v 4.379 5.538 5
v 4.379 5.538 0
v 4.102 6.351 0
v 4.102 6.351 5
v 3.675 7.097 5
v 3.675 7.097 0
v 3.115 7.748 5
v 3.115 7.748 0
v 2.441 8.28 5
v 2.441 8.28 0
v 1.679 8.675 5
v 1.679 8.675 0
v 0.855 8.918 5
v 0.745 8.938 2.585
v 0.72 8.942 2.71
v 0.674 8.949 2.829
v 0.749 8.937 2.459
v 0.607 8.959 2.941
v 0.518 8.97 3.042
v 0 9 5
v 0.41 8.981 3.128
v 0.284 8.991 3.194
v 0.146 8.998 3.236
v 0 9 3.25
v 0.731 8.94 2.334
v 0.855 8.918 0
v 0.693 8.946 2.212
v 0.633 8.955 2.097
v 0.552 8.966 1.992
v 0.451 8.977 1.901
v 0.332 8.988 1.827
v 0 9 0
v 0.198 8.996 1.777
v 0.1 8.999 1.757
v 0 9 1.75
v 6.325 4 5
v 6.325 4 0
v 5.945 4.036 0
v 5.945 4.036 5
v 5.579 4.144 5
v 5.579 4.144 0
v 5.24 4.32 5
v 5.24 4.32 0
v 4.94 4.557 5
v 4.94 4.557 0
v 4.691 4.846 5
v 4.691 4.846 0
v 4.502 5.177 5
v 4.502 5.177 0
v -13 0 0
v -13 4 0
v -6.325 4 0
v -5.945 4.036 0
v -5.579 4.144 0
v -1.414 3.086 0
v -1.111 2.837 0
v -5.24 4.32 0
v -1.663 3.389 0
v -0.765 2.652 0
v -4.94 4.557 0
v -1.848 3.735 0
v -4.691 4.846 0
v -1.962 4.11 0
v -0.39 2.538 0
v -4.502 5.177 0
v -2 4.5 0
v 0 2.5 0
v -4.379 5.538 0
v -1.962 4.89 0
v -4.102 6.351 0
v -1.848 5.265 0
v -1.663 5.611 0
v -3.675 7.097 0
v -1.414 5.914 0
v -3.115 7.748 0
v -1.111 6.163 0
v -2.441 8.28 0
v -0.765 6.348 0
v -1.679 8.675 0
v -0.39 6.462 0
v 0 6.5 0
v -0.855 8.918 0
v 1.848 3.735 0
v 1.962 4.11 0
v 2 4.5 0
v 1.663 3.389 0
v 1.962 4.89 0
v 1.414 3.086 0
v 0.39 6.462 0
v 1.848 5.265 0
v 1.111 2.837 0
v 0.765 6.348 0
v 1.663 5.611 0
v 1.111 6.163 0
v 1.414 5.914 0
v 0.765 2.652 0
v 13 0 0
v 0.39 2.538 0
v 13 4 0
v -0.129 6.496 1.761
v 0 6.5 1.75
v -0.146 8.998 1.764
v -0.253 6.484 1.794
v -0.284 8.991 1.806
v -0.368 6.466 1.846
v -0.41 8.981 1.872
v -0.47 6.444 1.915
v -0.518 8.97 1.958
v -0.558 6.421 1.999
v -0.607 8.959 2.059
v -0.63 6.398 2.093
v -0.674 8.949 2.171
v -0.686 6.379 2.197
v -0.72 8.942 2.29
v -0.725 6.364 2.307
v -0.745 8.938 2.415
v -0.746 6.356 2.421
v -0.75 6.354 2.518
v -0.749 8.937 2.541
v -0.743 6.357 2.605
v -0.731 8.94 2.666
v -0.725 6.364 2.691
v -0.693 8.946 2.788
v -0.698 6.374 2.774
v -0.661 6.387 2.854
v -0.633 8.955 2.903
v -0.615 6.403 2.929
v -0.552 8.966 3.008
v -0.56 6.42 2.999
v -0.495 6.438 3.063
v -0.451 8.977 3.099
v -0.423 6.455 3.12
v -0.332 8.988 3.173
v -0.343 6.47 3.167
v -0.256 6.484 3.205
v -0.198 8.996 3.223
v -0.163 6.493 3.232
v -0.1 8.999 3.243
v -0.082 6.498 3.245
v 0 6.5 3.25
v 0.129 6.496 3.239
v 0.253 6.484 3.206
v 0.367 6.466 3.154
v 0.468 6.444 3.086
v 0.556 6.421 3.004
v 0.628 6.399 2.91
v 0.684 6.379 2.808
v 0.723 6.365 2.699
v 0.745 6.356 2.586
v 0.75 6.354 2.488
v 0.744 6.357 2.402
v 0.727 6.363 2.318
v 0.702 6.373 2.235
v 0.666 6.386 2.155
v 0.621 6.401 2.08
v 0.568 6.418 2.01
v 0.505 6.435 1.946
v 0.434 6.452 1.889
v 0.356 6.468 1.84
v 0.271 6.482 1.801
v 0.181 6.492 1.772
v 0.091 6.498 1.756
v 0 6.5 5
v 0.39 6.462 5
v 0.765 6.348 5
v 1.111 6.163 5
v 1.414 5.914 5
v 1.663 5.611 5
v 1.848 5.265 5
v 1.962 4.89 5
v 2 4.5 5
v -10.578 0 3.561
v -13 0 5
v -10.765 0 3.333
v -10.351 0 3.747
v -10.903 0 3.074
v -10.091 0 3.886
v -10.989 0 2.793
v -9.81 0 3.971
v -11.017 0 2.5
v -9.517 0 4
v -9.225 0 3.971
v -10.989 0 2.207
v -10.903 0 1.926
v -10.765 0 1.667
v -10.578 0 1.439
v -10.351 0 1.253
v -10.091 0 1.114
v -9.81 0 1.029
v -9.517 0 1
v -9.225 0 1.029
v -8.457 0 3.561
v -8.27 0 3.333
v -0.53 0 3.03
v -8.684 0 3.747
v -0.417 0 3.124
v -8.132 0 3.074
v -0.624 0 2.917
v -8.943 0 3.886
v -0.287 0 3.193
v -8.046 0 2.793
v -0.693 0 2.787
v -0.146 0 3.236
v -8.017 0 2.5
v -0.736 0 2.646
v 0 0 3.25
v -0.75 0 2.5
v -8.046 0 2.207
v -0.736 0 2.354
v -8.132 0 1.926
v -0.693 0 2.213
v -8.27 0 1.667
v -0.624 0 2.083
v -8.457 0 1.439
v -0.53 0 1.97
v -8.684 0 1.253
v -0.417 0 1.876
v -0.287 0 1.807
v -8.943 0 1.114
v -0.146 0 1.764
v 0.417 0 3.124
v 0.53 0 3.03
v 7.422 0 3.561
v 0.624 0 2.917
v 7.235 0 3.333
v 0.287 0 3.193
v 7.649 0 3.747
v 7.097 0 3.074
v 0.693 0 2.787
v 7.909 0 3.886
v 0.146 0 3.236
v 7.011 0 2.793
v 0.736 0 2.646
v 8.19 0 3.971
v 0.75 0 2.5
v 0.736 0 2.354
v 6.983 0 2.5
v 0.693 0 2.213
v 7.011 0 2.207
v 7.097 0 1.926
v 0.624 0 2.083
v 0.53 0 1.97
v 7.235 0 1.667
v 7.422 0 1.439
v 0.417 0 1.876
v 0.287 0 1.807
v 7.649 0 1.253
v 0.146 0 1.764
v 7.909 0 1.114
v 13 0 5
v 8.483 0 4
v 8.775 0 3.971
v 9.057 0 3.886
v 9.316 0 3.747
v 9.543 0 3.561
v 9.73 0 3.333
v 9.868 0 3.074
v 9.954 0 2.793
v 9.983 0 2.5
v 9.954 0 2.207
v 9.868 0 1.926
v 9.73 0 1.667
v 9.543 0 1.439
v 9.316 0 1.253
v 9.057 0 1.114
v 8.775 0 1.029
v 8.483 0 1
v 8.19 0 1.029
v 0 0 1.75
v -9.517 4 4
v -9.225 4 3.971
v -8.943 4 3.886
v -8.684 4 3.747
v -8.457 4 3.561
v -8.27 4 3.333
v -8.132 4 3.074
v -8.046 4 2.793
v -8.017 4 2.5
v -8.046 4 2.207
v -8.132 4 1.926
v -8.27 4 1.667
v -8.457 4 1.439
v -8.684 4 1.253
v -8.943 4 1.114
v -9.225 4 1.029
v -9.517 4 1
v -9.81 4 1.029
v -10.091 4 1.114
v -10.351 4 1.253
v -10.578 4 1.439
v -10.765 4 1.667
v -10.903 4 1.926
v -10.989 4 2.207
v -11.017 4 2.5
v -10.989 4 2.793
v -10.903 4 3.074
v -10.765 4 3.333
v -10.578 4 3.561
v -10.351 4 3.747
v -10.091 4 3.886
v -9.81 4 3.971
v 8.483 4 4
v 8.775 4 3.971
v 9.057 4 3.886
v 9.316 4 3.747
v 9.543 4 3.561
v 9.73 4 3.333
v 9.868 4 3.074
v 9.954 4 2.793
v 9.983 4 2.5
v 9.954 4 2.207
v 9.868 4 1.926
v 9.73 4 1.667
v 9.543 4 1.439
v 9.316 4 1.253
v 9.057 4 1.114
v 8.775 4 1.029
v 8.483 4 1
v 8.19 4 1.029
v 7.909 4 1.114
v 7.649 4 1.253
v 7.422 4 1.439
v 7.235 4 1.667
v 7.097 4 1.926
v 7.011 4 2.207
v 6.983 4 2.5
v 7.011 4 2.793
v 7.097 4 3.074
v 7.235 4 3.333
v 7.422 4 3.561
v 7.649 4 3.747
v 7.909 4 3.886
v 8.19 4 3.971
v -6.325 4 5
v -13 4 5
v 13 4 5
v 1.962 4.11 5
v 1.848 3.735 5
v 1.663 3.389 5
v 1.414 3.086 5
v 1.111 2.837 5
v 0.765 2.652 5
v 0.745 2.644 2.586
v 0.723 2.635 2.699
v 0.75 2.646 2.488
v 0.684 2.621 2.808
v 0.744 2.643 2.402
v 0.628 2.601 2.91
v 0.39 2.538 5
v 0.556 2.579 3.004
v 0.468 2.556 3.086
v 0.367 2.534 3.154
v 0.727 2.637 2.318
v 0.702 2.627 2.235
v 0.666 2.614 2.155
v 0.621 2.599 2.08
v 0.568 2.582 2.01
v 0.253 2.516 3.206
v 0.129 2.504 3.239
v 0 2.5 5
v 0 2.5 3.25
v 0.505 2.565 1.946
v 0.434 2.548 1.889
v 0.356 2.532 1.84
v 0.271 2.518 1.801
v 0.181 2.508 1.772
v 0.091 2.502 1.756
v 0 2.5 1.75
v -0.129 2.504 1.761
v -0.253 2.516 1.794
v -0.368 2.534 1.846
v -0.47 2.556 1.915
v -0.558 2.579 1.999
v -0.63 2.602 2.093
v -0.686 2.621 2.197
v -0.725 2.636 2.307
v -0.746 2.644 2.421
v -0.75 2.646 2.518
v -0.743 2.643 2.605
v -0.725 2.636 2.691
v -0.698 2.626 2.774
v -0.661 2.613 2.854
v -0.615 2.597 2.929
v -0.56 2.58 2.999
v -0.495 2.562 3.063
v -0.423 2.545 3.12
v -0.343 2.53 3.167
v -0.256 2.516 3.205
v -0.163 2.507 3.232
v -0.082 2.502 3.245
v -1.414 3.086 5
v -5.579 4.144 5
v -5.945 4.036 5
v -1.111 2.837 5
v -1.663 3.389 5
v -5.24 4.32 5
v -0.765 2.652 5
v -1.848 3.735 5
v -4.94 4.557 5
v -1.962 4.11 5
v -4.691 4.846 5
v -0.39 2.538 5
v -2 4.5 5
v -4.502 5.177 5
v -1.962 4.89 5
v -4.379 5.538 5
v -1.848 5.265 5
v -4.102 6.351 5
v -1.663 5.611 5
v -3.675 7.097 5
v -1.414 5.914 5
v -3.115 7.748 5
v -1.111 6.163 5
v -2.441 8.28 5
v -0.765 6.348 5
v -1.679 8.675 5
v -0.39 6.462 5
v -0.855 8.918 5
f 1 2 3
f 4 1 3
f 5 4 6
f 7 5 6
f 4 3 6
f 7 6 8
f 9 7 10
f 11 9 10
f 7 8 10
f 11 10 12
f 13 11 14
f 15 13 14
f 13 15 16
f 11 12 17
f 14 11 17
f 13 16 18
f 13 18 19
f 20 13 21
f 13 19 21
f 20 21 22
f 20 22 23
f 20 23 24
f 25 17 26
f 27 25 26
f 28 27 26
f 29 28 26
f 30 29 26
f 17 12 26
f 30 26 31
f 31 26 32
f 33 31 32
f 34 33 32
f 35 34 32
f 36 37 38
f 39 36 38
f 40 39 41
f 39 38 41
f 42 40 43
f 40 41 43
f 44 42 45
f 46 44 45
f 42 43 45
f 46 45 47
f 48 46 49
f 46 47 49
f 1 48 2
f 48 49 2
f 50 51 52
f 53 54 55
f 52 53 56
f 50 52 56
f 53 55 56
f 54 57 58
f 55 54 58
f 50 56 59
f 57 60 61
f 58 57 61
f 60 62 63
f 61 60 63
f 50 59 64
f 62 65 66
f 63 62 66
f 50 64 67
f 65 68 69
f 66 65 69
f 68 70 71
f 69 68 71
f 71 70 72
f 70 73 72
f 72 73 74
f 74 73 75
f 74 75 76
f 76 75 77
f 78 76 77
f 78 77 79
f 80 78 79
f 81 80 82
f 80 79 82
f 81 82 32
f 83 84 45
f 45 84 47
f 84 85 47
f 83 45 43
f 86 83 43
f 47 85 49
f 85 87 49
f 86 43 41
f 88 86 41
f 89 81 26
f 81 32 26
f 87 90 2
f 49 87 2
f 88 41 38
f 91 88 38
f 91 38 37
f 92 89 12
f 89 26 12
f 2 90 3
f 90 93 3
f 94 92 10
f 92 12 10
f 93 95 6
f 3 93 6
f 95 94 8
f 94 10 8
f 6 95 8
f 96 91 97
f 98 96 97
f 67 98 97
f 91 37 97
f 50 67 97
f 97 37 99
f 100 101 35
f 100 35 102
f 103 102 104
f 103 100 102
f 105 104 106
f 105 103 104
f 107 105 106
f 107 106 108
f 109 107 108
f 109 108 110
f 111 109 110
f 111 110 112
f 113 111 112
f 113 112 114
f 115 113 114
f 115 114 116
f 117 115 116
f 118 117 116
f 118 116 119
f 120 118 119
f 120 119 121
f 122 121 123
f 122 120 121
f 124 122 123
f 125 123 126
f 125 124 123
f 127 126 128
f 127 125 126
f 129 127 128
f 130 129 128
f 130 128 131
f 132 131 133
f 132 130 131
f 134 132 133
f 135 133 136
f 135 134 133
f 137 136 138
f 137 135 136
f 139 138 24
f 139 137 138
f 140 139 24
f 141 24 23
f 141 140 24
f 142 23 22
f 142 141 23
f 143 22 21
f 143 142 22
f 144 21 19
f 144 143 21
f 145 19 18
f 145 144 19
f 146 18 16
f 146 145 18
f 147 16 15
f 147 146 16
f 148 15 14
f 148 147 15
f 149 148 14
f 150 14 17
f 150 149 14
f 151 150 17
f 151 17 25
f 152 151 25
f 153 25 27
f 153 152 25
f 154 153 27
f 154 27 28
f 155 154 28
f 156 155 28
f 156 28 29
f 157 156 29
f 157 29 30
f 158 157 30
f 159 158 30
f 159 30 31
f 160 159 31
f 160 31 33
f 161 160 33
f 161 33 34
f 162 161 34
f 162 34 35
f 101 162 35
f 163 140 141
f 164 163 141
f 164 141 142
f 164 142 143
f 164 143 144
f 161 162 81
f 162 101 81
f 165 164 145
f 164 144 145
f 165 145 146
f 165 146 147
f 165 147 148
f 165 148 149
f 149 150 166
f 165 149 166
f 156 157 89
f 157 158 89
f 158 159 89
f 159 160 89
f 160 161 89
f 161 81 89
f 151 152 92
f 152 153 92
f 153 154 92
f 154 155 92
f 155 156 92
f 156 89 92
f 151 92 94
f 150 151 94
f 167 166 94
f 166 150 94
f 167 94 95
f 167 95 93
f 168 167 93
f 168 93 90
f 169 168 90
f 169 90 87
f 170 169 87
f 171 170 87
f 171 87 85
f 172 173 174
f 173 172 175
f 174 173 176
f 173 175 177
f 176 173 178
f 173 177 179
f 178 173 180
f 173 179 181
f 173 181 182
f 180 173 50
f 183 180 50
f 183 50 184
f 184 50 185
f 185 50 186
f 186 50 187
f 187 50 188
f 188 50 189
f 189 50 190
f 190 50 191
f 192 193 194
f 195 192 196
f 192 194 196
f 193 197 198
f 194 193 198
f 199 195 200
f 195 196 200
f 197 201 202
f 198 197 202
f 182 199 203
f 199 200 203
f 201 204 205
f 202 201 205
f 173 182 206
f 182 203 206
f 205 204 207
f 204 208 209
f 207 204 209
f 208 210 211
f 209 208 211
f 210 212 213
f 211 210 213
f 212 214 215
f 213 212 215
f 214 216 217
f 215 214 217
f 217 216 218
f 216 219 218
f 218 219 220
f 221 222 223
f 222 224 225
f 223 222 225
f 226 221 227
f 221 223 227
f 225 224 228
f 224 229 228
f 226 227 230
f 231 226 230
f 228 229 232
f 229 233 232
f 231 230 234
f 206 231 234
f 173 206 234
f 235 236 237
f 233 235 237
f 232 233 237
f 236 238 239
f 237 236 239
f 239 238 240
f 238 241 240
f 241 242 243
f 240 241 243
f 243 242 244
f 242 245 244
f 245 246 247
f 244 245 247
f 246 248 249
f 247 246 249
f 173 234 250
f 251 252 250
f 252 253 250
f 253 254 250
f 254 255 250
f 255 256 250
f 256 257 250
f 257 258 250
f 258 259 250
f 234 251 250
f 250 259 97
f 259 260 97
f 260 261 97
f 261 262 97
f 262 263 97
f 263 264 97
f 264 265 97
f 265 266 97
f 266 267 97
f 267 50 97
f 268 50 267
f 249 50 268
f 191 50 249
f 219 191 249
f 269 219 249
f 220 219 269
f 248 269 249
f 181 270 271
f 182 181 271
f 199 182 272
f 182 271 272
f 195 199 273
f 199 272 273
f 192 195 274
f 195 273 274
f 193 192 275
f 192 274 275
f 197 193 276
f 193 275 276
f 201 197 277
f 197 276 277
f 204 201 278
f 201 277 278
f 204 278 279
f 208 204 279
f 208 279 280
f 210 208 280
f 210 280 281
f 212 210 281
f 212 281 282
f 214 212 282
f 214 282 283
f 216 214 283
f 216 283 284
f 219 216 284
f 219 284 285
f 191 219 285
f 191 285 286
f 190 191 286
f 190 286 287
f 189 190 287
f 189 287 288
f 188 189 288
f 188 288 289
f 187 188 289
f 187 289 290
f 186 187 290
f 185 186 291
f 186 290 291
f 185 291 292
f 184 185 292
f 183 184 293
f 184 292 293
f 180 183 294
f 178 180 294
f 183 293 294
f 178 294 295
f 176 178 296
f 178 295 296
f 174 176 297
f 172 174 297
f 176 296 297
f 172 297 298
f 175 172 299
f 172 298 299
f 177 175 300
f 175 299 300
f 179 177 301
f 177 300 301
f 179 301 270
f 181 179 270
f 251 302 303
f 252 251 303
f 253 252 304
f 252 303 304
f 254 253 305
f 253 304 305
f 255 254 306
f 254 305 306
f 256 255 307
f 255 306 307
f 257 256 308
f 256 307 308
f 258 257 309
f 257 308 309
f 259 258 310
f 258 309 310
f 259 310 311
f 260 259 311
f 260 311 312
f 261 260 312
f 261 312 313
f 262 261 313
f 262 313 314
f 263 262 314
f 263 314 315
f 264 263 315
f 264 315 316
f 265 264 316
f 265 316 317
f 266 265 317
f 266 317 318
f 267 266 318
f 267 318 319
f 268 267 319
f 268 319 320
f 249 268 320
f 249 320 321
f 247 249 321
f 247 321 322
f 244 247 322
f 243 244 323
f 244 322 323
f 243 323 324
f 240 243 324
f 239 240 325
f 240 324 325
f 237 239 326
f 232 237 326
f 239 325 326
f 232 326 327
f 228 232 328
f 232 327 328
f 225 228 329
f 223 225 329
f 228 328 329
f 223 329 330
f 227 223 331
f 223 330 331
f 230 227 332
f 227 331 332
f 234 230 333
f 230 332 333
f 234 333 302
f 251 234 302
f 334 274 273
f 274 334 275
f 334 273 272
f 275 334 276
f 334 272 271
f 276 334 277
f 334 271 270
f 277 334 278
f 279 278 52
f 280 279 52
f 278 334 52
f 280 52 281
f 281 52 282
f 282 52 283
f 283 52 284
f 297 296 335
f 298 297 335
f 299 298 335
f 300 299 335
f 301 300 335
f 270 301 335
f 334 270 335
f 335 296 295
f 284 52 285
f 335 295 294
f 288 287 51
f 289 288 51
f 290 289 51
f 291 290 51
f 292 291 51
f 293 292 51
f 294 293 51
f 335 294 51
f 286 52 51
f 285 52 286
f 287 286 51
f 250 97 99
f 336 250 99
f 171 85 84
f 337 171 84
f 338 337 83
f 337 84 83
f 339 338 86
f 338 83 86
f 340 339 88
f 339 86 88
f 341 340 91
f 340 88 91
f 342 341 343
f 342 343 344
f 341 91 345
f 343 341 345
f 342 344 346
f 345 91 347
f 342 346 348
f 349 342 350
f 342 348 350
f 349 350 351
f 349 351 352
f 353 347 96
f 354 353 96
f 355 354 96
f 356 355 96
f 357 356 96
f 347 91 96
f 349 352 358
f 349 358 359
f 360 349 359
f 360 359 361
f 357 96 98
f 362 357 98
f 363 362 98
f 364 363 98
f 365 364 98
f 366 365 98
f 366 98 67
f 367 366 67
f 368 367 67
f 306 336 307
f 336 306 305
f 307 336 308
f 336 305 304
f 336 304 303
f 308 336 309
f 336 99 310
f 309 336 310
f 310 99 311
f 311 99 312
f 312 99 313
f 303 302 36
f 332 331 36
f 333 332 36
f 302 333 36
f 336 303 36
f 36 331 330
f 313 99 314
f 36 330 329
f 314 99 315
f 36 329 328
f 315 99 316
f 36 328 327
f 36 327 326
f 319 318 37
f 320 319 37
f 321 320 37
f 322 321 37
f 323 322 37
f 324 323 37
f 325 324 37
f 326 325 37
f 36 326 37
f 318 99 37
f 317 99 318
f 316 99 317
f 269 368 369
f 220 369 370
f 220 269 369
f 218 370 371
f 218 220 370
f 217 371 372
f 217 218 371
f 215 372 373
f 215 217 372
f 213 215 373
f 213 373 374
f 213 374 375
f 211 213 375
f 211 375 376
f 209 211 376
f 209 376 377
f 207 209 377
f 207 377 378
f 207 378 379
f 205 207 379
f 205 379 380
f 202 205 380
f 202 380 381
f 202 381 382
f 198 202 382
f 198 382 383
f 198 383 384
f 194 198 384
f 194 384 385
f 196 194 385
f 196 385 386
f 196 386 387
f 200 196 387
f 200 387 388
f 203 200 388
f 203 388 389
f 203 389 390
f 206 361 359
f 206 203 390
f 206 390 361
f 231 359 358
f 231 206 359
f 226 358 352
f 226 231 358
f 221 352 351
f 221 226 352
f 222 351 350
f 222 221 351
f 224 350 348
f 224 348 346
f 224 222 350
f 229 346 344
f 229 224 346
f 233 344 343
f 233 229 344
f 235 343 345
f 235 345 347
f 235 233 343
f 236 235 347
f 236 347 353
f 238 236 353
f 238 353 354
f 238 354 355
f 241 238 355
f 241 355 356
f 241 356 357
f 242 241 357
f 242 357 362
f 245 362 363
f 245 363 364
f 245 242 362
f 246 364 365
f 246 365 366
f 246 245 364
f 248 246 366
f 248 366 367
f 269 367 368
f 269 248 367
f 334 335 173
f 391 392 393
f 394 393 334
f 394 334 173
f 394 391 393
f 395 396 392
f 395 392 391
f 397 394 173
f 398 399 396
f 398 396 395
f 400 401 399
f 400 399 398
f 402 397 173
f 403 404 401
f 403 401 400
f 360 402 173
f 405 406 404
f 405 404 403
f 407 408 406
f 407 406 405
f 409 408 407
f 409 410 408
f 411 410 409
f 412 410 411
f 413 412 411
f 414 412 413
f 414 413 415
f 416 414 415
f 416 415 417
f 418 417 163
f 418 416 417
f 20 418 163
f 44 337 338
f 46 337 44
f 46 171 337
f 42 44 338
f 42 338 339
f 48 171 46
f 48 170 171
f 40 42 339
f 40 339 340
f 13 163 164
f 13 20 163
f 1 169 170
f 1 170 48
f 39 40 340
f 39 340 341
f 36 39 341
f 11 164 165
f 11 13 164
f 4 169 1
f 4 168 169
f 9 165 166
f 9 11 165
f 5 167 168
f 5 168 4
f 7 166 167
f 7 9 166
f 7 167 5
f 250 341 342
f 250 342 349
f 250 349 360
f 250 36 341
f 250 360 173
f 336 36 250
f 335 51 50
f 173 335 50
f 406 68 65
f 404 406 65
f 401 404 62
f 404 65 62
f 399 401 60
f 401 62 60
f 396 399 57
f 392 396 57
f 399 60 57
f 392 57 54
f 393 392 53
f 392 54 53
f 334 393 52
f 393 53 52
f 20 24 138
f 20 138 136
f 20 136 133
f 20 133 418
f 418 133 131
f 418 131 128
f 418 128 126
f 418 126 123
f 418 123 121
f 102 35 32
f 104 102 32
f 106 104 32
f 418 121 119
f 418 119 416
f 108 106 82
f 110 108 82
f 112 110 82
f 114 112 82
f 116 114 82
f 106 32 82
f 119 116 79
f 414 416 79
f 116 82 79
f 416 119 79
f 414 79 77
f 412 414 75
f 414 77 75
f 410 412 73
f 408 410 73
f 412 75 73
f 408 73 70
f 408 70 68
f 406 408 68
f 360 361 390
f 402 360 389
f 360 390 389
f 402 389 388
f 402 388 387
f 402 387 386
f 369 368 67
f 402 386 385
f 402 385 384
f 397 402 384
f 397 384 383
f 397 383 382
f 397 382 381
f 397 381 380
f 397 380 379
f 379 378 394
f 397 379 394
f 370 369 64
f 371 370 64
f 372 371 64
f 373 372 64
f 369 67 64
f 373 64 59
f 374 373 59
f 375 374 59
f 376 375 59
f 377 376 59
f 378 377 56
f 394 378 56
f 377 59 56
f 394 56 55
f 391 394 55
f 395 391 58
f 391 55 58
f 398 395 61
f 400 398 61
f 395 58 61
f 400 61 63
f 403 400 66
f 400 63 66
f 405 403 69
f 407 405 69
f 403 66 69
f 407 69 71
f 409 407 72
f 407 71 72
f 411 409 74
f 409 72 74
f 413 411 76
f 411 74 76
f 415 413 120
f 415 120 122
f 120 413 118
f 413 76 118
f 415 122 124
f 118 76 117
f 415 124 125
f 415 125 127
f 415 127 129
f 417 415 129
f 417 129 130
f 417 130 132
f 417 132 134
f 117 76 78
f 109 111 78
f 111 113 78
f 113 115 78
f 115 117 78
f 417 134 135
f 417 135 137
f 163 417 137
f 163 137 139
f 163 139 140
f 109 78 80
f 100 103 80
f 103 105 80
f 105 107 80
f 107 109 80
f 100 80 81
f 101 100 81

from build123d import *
from build123d.topology import SkipClean

# Parameters (mm, degrees)
BOSS_EXTRUDE1_DEPTH     = 5
SKETCH2_R               = 1.5
CUT_EXTRUDE1_DEPTH      = 5
CUT_EXTRUDE2_DEPTH      = 15.798648587
CUT_EXTRUDE2_DEPTH_BACK = 15.798648587
SKETCH3_R               = 0.75


with BuildPart() as part:
    # Sketch1 → Boss-Extrude1 (new body)
    with BuildSketch(Plane.XY):
        with BuildLine():
            Line((-13, 0), (0, 0))
            Line((0, 0), (0, 2.5))
            ThreePointArc((0, 2.5), (-2, 4.5), (0, 6.5))
            Line((0, 6.5), (0, 9))
            ThreePointArc((0, 9), (-2.790781528, 8.030090432), (-4.378538299, 5.538461538))
            ThreePointArc((-4.378538299, 5.538461538), (-5.084207974, 4.431070919), (-6.32455532, 4))
            Line((-6.32455532, 4), (-13, 4))
            Line((-13, 4), (-13, 0))
        make_face()
        with BuildLine():
            Line((0, 2.5), (0, 0))
            Line((0, 0), (13, 0))
            Line((13, 0), (13, 4))
            Line((13, 4), (6.32455532, 4))
            ThreePointArc((6.32455532, 4), (5.084207974, 4.431070919), (4.378538299, 5.538461538))
            ThreePointArc((4.378538299, 5.538461538), (2.790781528, 8.030090432), (0, 9))
            Line((0, 9), (0, 6.5))
            ThreePointArc((0, 6.5), (1.414213562, 5.914213562), (2, 4.5))
            ThreePointArc((2, 4.5), (1.414213562, 3.085786438), (0, 2.5))
        make_face()
    extrude(amount=BOSS_EXTRUDE1_DEPTH)

    # Sketch2 → Cut-Extrude1 (cut)
    with BuildSketch(Plane(origin=(0, 4, 0), x_dir=(1, 0, 0), z_dir=(0, 1, 0))):
        with Locations(Location((-9.517345142, -2.5, 0), (0, 0, 270))):
            Circle(SKETCH2_R)
        with Locations(Location((8.482654858, -2.5, 0), (0, 0, 270))):
            Circle(SKETCH2_R)
    extrude(amount=-CUT_EXTRUDE1_DEPTH, mode=Mode.SUBTRACT)

    # Sketch3 → Cut-Extrude2 (cut, two sides: drawn at the far end of the back side and taken through both)
    with SkipClean():  # the faces are left unmerged after this step: merging them gives an invalid solid
        with BuildSketch(Plane(origin=(0, 4, 0), x_dir=(1, 0, 0), z_dir=(0, 1, 0)).offset(-CUT_EXTRUDE2_DEPTH_BACK)):
            with Locations(Location((0, -2.5, 0), (0, 0, 90))):
                Circle(SKETCH3_R)
        extrude(amount=CUT_EXTRUDE2_DEPTH + CUT_EXTRUDE2_DEPTH_BACK, mode=Mode.SUBTRACT)


solid = part.part
